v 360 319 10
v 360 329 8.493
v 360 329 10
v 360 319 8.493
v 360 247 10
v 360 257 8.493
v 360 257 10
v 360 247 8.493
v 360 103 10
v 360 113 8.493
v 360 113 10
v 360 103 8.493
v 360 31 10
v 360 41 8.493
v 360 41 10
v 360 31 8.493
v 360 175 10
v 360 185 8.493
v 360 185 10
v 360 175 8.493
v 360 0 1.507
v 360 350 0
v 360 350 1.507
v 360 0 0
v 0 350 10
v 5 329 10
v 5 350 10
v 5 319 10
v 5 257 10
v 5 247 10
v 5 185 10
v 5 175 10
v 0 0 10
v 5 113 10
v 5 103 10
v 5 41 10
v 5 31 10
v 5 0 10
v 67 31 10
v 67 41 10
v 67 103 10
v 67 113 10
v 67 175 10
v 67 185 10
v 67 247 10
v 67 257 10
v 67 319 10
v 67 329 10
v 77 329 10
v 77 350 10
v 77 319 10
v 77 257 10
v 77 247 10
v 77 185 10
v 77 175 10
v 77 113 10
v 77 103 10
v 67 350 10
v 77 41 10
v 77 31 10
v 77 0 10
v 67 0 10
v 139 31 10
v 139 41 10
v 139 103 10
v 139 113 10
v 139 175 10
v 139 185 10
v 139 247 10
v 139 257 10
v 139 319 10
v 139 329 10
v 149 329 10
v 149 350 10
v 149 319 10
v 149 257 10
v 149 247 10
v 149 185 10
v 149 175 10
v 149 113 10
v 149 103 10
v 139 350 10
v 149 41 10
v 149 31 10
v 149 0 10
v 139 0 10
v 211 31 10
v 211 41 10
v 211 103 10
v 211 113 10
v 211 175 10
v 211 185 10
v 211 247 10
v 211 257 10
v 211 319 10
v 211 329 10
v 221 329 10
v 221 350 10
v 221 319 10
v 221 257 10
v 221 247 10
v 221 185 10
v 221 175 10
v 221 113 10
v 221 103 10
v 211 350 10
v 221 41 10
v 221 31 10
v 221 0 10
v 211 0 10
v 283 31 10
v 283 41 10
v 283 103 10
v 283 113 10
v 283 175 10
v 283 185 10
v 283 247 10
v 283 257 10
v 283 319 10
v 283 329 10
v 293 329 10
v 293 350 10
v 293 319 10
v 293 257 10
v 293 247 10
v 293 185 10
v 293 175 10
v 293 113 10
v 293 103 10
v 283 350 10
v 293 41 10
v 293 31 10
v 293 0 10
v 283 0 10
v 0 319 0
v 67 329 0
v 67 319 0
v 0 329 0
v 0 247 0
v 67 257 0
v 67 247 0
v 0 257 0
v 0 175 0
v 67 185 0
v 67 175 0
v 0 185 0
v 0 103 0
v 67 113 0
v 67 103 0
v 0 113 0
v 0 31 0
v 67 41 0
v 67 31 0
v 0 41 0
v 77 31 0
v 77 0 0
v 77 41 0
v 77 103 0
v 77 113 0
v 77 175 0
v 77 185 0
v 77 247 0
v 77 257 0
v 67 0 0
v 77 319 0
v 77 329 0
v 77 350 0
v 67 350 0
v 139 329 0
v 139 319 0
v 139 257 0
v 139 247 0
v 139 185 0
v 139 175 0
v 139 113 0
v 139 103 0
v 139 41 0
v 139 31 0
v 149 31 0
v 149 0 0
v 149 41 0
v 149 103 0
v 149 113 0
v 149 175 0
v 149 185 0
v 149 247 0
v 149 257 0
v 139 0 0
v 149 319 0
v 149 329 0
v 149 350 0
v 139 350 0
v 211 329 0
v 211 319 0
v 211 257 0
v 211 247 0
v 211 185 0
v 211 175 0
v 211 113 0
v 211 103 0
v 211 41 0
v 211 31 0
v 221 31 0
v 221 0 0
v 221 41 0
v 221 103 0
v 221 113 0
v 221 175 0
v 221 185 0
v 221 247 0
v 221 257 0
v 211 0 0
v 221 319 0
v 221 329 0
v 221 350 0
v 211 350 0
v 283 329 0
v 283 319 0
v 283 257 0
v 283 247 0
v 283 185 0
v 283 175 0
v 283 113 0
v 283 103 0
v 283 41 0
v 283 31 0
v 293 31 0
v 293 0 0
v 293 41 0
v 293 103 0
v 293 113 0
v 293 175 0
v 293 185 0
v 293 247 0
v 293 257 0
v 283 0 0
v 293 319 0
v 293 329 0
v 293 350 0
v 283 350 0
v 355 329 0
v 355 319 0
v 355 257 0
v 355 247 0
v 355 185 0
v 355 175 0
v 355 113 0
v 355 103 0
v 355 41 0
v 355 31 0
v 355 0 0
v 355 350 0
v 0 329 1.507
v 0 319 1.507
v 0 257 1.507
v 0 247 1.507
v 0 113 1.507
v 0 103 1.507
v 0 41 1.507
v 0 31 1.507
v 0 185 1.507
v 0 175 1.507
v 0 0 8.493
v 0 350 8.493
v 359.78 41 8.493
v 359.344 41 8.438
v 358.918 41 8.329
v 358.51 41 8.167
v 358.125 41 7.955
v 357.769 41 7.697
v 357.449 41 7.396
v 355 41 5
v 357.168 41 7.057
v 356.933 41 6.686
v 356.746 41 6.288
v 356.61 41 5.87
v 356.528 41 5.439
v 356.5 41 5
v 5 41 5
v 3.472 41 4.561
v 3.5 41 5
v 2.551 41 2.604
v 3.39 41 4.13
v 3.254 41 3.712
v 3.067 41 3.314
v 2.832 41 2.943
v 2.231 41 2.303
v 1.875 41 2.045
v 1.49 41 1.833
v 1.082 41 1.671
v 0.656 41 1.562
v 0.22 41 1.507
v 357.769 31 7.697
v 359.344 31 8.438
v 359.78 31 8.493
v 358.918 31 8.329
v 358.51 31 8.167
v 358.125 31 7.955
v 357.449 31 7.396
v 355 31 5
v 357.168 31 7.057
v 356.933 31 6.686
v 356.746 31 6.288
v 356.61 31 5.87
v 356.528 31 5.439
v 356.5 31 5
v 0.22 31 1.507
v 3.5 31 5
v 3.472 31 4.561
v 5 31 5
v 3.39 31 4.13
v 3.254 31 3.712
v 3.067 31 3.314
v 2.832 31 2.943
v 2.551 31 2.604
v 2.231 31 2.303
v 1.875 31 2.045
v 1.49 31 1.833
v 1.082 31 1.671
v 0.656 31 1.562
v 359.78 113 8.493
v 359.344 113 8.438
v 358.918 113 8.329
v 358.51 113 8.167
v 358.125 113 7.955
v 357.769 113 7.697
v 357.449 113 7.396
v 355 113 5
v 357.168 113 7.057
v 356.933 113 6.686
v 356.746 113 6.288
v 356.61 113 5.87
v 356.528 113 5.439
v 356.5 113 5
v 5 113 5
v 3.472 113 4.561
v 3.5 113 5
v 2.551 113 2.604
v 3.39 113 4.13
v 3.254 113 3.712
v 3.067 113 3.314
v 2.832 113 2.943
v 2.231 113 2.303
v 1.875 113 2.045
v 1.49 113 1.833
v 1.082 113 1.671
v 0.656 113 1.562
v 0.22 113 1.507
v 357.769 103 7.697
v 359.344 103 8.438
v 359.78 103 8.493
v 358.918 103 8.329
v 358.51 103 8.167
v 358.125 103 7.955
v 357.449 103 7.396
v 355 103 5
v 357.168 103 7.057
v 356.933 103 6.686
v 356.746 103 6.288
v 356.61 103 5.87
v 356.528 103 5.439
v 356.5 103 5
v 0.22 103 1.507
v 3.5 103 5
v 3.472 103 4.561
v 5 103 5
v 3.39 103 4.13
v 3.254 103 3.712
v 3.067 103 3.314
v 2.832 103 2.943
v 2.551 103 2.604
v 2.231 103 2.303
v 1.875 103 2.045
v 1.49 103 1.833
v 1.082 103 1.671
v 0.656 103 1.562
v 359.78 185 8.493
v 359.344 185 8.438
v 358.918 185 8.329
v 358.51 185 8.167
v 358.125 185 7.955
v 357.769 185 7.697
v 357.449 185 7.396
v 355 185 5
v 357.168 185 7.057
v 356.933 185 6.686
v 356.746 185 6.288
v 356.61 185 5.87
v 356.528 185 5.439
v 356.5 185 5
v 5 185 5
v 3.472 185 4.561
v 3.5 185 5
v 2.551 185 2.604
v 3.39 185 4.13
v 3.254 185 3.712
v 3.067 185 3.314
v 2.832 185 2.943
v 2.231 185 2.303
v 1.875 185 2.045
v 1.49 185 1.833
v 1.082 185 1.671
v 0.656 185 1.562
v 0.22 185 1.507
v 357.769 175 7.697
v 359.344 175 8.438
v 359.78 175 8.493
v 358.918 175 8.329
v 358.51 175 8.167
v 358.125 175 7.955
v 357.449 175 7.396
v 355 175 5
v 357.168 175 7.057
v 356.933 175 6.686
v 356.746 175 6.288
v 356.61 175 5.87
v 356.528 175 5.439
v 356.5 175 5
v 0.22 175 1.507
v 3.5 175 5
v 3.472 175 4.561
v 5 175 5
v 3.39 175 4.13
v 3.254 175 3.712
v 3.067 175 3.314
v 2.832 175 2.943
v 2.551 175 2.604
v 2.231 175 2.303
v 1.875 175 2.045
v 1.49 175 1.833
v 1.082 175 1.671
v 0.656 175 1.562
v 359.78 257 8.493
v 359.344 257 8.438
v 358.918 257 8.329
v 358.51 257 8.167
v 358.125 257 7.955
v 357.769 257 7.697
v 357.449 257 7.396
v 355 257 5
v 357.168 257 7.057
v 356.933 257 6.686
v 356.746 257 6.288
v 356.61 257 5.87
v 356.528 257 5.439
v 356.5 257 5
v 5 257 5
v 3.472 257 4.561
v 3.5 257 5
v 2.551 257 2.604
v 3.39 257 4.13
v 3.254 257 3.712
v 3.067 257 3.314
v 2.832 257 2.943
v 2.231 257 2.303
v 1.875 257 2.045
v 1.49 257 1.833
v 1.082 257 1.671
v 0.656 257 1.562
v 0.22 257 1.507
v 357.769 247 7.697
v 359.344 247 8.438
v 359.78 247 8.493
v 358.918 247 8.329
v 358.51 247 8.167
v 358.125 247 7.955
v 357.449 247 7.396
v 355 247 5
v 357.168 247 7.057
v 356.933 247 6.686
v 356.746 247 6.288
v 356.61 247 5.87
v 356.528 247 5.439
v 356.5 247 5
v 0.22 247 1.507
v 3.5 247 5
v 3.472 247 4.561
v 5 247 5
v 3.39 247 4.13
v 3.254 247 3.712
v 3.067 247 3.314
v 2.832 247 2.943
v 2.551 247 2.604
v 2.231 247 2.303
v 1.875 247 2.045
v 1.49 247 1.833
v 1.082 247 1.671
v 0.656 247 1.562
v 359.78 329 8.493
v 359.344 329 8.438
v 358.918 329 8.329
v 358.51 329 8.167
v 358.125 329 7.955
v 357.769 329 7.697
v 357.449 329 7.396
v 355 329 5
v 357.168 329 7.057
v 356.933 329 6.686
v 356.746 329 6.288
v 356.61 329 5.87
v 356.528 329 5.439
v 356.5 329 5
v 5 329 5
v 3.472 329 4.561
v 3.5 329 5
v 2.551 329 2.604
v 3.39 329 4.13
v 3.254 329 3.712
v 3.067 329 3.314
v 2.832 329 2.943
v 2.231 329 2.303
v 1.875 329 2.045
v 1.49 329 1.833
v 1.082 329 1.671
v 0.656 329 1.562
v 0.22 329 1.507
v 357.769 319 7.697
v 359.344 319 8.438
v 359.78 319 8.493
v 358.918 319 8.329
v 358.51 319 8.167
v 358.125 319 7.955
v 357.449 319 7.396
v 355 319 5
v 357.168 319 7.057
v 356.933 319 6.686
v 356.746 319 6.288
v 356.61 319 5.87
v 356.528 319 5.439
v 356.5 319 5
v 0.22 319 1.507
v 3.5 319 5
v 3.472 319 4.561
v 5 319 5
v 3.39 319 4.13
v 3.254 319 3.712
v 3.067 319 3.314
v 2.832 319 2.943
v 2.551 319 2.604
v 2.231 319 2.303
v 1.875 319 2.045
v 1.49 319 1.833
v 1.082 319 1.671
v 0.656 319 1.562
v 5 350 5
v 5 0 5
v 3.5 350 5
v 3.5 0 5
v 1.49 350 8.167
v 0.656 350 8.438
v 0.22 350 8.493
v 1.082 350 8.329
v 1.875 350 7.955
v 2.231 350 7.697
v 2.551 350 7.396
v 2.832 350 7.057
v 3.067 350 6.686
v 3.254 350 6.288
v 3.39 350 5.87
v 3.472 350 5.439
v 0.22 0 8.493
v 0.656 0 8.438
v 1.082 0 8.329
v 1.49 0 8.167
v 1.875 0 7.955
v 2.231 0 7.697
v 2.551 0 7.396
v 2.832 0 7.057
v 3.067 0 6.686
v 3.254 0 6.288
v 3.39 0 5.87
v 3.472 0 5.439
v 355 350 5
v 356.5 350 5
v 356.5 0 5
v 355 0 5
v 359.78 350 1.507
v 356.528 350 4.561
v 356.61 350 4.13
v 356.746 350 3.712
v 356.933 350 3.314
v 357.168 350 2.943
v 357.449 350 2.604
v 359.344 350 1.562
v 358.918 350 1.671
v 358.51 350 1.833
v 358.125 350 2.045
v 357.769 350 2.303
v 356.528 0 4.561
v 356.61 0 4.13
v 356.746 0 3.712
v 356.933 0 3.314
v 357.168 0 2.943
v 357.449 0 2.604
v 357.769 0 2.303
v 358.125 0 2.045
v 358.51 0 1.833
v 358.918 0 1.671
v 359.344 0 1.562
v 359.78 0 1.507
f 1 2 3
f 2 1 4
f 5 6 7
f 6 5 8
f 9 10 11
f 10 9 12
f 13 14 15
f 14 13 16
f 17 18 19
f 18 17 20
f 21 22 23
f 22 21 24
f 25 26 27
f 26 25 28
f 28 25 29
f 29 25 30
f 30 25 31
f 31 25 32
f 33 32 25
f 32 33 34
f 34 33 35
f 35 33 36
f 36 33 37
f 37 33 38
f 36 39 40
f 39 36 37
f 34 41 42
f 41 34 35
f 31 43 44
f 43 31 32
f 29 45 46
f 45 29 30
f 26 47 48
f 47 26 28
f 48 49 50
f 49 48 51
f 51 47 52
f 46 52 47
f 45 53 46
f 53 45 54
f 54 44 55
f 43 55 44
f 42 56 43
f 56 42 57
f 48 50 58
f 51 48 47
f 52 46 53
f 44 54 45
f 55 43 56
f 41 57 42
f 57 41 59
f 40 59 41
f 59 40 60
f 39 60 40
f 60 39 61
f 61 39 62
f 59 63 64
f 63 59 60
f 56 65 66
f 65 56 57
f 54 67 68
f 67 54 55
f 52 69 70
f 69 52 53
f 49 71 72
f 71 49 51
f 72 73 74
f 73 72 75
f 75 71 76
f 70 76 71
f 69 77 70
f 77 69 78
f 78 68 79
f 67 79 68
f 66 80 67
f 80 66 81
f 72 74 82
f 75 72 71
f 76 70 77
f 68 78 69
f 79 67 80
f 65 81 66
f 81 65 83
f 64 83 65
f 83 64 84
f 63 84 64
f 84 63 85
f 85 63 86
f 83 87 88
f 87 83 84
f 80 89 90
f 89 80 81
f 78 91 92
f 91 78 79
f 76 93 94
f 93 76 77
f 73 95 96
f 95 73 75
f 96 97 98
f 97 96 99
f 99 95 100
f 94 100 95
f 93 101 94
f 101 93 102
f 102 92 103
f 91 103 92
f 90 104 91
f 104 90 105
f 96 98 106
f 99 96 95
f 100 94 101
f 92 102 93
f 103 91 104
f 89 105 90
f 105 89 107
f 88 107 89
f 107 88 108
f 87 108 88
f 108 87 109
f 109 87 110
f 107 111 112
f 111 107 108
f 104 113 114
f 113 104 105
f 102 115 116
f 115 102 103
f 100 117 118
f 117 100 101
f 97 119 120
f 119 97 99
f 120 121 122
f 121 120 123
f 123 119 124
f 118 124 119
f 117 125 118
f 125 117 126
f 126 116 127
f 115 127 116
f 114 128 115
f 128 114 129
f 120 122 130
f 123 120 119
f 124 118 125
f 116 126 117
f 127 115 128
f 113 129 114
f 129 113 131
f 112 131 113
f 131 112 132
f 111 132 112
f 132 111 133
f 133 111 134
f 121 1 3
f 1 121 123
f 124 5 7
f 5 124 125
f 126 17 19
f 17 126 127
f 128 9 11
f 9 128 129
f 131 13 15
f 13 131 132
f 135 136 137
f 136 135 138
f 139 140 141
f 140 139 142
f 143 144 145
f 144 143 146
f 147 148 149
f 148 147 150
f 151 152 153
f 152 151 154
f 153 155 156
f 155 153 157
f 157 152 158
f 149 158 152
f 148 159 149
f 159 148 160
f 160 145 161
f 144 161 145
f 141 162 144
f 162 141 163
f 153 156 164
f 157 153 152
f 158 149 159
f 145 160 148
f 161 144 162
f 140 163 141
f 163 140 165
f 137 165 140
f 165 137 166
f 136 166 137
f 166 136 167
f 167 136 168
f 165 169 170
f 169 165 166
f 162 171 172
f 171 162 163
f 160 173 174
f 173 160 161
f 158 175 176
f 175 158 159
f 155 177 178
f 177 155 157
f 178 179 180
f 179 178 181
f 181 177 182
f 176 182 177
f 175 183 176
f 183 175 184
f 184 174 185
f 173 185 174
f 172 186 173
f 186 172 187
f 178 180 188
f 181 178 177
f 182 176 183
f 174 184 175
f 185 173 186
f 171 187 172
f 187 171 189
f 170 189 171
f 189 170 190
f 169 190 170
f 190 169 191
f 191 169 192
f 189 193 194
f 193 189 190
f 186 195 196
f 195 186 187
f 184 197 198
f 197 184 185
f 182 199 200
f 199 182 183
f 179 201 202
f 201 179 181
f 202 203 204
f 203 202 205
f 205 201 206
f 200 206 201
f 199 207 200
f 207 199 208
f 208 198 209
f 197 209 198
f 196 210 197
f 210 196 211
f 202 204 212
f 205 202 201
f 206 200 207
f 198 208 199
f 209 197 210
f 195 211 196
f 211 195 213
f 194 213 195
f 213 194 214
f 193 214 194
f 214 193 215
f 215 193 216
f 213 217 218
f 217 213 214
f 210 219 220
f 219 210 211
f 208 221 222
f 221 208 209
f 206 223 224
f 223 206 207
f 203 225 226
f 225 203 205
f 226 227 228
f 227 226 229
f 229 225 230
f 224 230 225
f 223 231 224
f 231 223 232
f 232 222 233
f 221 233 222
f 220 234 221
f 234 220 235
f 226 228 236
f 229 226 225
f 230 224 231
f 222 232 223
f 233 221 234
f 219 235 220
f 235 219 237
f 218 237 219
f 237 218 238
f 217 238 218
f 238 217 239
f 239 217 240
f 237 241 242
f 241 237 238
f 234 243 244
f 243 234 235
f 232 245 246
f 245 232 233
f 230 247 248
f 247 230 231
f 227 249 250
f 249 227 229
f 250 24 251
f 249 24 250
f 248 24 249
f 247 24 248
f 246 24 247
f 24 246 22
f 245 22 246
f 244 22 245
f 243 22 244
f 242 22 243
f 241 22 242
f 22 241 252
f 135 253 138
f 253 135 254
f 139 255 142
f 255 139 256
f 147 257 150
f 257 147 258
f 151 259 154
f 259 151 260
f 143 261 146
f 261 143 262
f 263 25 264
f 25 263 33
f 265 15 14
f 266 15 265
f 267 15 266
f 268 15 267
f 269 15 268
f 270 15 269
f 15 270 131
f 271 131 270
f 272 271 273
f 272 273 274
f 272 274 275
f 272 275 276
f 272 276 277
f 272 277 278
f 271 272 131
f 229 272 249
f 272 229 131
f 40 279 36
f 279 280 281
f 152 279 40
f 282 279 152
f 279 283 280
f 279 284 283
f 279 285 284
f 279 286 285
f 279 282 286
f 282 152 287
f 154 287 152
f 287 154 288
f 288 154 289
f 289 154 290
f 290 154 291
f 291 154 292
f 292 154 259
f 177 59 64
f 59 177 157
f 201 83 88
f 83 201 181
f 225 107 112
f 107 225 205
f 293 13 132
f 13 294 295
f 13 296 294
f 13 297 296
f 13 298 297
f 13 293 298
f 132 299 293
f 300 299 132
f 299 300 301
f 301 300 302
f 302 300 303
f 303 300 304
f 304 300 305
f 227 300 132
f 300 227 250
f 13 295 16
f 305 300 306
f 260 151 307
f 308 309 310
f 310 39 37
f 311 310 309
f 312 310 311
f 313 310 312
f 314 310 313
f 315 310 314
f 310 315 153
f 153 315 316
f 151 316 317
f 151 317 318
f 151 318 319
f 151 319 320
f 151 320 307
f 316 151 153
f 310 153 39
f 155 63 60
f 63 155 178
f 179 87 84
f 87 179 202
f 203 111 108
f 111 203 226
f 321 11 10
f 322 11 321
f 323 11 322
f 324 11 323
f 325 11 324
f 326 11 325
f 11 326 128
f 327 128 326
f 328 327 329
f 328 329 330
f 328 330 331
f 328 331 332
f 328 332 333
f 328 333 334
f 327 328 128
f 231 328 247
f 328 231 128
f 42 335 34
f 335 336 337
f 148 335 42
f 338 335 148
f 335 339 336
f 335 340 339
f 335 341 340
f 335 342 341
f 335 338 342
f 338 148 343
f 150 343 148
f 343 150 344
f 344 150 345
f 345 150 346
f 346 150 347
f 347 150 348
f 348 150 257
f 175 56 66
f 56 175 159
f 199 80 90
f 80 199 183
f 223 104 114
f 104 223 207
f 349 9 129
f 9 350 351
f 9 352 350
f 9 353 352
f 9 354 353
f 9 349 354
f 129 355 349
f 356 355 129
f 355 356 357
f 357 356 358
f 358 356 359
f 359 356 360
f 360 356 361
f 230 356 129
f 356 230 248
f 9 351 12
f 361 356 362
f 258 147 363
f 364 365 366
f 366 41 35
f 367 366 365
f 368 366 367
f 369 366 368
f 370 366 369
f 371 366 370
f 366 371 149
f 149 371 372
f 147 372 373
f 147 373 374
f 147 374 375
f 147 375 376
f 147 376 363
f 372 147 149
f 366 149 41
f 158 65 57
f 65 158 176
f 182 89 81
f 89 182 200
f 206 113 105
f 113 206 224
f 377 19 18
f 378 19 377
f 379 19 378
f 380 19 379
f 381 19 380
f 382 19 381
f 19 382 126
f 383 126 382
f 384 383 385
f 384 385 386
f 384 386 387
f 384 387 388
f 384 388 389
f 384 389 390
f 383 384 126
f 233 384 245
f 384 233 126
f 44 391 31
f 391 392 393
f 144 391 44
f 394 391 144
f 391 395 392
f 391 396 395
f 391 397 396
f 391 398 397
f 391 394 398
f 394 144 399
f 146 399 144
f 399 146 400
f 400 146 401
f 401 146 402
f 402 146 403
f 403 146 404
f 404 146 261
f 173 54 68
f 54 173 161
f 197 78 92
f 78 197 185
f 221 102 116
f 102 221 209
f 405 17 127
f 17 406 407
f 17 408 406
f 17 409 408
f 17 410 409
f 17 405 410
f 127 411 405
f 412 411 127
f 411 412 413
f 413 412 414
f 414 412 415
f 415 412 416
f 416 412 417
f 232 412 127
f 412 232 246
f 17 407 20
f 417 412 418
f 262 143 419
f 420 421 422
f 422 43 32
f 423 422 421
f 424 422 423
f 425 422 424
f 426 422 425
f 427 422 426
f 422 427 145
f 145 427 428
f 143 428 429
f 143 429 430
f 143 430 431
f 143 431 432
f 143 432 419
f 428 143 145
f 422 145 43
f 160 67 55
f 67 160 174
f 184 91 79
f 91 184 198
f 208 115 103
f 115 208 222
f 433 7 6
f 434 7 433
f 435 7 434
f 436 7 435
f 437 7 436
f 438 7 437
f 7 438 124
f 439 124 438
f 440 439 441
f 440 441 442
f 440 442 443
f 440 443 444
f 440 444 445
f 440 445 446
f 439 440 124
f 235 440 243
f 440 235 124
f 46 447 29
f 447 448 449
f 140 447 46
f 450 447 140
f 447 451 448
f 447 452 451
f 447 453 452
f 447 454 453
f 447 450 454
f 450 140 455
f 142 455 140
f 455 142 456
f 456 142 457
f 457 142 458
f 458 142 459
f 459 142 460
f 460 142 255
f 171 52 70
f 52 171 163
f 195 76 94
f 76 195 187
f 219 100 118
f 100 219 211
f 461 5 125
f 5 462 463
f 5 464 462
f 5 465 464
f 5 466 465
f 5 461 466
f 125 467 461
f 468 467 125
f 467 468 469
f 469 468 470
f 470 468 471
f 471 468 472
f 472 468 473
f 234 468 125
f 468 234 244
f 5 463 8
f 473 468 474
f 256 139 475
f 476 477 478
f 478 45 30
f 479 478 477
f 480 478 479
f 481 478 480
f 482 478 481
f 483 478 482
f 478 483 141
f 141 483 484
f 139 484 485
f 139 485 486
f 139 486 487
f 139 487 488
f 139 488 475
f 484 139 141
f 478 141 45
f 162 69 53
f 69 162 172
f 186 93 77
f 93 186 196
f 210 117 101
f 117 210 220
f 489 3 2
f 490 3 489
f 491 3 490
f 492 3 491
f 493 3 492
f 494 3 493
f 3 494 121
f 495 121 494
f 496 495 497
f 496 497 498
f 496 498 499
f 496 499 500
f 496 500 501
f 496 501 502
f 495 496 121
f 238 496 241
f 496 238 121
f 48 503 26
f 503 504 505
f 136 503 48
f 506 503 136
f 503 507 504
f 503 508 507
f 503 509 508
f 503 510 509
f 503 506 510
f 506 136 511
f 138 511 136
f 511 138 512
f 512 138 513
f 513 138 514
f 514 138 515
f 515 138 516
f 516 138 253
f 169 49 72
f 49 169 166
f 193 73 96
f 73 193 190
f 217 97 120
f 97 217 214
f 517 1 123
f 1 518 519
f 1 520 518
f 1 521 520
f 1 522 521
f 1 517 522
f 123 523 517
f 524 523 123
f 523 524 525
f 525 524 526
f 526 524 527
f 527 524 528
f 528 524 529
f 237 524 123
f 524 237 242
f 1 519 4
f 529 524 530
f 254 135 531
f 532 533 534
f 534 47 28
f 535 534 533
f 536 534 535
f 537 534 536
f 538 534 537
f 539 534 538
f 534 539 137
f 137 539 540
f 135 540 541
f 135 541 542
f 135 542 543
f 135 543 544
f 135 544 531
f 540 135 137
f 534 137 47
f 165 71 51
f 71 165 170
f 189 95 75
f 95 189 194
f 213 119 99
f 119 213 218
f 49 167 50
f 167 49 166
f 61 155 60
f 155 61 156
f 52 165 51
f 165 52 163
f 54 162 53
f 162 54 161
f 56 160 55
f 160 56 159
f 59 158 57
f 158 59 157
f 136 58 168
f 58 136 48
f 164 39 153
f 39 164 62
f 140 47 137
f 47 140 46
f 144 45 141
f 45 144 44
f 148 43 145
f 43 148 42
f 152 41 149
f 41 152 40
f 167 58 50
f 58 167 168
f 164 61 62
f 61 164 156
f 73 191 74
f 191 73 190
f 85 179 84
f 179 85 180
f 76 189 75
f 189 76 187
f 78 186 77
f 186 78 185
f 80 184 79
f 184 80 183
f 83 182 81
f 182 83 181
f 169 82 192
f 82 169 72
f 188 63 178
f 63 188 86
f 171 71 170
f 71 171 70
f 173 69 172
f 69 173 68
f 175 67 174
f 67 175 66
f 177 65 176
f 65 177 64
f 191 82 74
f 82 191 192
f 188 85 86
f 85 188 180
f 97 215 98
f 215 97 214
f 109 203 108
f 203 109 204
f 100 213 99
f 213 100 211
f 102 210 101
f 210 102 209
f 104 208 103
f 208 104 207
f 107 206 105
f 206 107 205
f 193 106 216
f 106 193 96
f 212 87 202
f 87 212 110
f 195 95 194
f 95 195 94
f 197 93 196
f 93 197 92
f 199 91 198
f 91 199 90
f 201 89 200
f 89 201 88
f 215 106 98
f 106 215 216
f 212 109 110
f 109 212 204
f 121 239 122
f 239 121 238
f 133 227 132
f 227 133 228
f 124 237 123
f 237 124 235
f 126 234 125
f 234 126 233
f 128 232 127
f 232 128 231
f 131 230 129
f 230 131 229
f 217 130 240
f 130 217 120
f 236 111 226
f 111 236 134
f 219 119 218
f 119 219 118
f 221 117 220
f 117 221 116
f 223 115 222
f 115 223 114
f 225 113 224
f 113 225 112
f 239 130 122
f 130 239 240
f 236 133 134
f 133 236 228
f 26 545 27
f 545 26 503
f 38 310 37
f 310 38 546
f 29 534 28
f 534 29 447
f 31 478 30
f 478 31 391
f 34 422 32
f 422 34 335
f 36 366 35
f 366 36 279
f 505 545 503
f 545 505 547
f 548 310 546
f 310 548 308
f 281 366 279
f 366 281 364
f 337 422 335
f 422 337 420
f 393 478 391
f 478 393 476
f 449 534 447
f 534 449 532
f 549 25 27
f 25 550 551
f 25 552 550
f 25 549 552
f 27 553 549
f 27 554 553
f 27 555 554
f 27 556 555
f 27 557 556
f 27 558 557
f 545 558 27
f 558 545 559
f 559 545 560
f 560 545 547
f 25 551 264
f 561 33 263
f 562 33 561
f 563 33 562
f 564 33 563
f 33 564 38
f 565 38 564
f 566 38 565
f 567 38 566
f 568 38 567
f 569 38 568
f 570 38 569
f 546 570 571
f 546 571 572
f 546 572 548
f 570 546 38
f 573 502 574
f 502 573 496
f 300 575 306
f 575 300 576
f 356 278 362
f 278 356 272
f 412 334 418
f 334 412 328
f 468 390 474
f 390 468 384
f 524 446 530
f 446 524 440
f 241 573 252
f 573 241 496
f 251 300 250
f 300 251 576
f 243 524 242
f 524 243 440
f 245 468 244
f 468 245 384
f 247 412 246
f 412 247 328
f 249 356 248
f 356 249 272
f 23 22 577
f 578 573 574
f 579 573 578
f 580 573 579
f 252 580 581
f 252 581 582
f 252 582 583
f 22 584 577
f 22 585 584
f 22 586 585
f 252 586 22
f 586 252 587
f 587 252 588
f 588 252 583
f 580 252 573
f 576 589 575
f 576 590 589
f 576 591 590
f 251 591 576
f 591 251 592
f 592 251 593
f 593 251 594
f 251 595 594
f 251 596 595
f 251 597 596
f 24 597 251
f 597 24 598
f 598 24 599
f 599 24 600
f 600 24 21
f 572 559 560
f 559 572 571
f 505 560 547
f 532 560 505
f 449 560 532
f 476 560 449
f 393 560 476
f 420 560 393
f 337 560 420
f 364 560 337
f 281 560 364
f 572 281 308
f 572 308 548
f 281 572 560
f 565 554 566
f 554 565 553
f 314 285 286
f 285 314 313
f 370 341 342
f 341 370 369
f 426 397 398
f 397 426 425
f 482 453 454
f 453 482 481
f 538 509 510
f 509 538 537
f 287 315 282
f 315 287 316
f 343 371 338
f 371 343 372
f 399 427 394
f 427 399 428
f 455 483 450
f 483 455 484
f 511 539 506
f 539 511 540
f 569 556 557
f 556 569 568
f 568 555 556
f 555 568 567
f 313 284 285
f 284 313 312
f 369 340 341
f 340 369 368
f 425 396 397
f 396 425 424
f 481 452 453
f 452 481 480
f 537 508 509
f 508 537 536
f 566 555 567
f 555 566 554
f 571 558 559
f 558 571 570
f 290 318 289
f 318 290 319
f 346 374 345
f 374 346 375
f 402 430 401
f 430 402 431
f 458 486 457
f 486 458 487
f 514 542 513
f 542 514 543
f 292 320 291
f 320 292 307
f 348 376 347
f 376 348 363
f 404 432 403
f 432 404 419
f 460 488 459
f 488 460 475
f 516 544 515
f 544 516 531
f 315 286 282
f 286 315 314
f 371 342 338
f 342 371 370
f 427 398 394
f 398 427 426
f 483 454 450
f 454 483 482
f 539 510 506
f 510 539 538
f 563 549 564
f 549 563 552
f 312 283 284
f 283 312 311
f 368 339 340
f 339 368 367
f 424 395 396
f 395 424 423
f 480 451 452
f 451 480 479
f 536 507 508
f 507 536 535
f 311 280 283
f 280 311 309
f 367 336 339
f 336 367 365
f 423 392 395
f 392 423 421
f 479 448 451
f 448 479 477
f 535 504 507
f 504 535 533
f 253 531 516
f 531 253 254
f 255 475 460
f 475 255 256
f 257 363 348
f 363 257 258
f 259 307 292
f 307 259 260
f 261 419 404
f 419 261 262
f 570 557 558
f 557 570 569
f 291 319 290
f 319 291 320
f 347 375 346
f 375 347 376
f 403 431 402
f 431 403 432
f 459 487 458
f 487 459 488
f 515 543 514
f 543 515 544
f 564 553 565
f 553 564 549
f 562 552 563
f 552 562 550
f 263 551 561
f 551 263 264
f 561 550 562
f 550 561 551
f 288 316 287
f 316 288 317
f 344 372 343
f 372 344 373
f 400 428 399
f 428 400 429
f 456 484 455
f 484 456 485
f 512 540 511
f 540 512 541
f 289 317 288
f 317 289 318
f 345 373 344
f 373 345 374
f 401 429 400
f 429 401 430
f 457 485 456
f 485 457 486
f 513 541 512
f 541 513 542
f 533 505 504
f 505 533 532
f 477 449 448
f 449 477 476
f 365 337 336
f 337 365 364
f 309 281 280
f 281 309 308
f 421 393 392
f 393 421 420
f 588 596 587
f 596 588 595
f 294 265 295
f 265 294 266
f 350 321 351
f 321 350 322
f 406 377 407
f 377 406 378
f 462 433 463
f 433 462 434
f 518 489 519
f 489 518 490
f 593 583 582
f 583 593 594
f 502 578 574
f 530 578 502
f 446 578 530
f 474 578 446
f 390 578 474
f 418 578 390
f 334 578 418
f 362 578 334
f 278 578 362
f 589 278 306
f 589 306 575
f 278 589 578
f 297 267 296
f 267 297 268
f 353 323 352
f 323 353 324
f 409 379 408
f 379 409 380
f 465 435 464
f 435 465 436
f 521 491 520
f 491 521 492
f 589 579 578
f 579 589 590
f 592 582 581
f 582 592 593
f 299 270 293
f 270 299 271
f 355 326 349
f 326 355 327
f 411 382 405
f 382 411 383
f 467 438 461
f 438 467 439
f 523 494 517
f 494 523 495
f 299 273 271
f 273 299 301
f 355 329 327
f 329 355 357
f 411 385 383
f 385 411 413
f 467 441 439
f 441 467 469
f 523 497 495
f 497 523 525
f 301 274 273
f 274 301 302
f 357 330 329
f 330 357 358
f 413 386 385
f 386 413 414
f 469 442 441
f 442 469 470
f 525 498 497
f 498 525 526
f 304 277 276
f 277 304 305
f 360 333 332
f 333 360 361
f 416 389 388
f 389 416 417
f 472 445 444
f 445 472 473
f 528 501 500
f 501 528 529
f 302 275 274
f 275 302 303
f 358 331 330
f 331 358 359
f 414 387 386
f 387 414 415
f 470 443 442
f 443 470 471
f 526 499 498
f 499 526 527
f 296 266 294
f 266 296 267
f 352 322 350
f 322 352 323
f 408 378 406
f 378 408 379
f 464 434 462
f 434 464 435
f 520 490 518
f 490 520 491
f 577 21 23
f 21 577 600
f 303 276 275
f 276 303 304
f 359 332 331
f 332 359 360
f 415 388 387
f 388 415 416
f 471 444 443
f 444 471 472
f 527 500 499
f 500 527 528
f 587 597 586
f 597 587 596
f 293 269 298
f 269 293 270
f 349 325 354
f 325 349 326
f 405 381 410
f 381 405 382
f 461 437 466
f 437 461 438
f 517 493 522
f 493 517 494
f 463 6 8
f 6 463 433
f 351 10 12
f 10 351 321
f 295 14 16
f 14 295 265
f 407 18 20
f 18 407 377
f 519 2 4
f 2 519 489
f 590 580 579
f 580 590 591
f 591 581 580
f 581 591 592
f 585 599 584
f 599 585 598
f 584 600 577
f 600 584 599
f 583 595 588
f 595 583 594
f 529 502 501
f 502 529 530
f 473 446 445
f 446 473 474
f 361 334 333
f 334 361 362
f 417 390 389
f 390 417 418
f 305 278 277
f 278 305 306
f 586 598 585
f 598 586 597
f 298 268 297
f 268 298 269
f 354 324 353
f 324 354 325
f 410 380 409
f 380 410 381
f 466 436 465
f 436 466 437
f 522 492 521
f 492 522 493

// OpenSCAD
difference()
{
  union()
  {
    translate([67, 0, 0]) cube([10, 350, 10]);
    translate([139, 0, 0]) cube([10, 350, 10]);
    translate([211, 0, 0]) cube([10, 350, 10]);
    translate([283, 0, 0]) cube([10, 350, 10]);
    h = [36, 108, 180, 252, 324];
    for(c = h)
    {
      translate([0, c -5, 0]) cube([360, 10, 10]);
    }
    translate([0, 0, 5]) cube([5, 350, 5]);
    translate([355, 0, 0]) cube([5, 350, 5]);
  }
  intersection()
  {
    translate([0, 175, 5]) rotate([90, 0, 0]) cylinder(h = 352, r = 3.5, $fn = 50, center = true);
    translate([0, 0, 0]) cube([10, 350, 10]);
  }
  intersection()
  {
    translate([360, 175, 5]) rotate([90, 0, 0]) cylinder(h = 352, r = 3.5, $fn = 50, center = true);
    translate([350, 0, 0]) cube([10, 350, 10]);
  }
}
